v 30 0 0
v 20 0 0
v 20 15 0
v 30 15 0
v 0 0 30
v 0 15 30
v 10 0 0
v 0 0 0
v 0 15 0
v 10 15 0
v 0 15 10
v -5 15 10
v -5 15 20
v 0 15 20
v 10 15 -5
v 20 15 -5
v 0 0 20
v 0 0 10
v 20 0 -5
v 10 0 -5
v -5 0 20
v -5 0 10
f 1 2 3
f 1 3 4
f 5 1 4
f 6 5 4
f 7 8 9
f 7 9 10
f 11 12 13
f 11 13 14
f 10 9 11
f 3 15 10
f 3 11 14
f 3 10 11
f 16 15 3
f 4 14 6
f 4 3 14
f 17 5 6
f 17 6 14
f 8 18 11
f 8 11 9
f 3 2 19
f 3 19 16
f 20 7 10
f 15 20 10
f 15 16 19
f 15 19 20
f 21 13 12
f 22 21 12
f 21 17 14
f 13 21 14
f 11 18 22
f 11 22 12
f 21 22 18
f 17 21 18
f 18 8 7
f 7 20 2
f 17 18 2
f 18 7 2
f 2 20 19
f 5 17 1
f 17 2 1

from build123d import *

# Parameters (mm, degrees)
ESQUISSE1_W        = 30
ESQUISSE1_H        = 30
BOSS_EXTRU_1_DEPTH = 15
ESQUISSE3_W        = 10
ESQUISSE3_H        = 15
BOSS_EXTRU_2_DEPTH = 5
CHANFREIN1_SIZE    = 30


with BuildPart() as part:
    # Esquisse1 → Boss.-Extru.1 (new body)
    with BuildSketch(Plane(origin=(0, 0, 0), x_dir=(1, 0, 0), z_dir=(0, 1, 0))):
        with Locations((15, -15)):
            Rectangle(ESQUISSE1_W, ESQUISSE1_H)
    extrude(amount=BOSS_EXTRU_1_DEPTH)

    # Esquisse3 → Boss.-Extru.2 (add)
    with BuildSketch(Plane(origin=(0, 0, 0), x_dir=(-1, 0, 0), z_dir=(0, 0, -1))):
        with Locations((-15, 7.5)):
            Rectangle(ESQUISSE3_W, ESQUISSE3_H)
    boss_extru_2 = extrude(amount=BOSS_EXTRU_2_DEPTH)

    # Symétrie1: Boss.-Extru.2 across plane
    add(boss_extru_2.mirror(Plane(origin=(0, 0, 0), x_dir=(0.7071067811865476, 0, 0.7071067811865475), z_dir=(0.7071067811865475, 0, -0.7071067811865476))))

    # Chanfrein1
    chanfrein1_edges = [part.edges().sort_by_distance(p)[0] for p in [
        (30, 7.5, 30),
    ]]
    chamfer(chanfrein1_edges, length=CHANFREIN1_SIZE - 0.0001)  # a hair under: the kernel refuses the full size


solid = part.part
